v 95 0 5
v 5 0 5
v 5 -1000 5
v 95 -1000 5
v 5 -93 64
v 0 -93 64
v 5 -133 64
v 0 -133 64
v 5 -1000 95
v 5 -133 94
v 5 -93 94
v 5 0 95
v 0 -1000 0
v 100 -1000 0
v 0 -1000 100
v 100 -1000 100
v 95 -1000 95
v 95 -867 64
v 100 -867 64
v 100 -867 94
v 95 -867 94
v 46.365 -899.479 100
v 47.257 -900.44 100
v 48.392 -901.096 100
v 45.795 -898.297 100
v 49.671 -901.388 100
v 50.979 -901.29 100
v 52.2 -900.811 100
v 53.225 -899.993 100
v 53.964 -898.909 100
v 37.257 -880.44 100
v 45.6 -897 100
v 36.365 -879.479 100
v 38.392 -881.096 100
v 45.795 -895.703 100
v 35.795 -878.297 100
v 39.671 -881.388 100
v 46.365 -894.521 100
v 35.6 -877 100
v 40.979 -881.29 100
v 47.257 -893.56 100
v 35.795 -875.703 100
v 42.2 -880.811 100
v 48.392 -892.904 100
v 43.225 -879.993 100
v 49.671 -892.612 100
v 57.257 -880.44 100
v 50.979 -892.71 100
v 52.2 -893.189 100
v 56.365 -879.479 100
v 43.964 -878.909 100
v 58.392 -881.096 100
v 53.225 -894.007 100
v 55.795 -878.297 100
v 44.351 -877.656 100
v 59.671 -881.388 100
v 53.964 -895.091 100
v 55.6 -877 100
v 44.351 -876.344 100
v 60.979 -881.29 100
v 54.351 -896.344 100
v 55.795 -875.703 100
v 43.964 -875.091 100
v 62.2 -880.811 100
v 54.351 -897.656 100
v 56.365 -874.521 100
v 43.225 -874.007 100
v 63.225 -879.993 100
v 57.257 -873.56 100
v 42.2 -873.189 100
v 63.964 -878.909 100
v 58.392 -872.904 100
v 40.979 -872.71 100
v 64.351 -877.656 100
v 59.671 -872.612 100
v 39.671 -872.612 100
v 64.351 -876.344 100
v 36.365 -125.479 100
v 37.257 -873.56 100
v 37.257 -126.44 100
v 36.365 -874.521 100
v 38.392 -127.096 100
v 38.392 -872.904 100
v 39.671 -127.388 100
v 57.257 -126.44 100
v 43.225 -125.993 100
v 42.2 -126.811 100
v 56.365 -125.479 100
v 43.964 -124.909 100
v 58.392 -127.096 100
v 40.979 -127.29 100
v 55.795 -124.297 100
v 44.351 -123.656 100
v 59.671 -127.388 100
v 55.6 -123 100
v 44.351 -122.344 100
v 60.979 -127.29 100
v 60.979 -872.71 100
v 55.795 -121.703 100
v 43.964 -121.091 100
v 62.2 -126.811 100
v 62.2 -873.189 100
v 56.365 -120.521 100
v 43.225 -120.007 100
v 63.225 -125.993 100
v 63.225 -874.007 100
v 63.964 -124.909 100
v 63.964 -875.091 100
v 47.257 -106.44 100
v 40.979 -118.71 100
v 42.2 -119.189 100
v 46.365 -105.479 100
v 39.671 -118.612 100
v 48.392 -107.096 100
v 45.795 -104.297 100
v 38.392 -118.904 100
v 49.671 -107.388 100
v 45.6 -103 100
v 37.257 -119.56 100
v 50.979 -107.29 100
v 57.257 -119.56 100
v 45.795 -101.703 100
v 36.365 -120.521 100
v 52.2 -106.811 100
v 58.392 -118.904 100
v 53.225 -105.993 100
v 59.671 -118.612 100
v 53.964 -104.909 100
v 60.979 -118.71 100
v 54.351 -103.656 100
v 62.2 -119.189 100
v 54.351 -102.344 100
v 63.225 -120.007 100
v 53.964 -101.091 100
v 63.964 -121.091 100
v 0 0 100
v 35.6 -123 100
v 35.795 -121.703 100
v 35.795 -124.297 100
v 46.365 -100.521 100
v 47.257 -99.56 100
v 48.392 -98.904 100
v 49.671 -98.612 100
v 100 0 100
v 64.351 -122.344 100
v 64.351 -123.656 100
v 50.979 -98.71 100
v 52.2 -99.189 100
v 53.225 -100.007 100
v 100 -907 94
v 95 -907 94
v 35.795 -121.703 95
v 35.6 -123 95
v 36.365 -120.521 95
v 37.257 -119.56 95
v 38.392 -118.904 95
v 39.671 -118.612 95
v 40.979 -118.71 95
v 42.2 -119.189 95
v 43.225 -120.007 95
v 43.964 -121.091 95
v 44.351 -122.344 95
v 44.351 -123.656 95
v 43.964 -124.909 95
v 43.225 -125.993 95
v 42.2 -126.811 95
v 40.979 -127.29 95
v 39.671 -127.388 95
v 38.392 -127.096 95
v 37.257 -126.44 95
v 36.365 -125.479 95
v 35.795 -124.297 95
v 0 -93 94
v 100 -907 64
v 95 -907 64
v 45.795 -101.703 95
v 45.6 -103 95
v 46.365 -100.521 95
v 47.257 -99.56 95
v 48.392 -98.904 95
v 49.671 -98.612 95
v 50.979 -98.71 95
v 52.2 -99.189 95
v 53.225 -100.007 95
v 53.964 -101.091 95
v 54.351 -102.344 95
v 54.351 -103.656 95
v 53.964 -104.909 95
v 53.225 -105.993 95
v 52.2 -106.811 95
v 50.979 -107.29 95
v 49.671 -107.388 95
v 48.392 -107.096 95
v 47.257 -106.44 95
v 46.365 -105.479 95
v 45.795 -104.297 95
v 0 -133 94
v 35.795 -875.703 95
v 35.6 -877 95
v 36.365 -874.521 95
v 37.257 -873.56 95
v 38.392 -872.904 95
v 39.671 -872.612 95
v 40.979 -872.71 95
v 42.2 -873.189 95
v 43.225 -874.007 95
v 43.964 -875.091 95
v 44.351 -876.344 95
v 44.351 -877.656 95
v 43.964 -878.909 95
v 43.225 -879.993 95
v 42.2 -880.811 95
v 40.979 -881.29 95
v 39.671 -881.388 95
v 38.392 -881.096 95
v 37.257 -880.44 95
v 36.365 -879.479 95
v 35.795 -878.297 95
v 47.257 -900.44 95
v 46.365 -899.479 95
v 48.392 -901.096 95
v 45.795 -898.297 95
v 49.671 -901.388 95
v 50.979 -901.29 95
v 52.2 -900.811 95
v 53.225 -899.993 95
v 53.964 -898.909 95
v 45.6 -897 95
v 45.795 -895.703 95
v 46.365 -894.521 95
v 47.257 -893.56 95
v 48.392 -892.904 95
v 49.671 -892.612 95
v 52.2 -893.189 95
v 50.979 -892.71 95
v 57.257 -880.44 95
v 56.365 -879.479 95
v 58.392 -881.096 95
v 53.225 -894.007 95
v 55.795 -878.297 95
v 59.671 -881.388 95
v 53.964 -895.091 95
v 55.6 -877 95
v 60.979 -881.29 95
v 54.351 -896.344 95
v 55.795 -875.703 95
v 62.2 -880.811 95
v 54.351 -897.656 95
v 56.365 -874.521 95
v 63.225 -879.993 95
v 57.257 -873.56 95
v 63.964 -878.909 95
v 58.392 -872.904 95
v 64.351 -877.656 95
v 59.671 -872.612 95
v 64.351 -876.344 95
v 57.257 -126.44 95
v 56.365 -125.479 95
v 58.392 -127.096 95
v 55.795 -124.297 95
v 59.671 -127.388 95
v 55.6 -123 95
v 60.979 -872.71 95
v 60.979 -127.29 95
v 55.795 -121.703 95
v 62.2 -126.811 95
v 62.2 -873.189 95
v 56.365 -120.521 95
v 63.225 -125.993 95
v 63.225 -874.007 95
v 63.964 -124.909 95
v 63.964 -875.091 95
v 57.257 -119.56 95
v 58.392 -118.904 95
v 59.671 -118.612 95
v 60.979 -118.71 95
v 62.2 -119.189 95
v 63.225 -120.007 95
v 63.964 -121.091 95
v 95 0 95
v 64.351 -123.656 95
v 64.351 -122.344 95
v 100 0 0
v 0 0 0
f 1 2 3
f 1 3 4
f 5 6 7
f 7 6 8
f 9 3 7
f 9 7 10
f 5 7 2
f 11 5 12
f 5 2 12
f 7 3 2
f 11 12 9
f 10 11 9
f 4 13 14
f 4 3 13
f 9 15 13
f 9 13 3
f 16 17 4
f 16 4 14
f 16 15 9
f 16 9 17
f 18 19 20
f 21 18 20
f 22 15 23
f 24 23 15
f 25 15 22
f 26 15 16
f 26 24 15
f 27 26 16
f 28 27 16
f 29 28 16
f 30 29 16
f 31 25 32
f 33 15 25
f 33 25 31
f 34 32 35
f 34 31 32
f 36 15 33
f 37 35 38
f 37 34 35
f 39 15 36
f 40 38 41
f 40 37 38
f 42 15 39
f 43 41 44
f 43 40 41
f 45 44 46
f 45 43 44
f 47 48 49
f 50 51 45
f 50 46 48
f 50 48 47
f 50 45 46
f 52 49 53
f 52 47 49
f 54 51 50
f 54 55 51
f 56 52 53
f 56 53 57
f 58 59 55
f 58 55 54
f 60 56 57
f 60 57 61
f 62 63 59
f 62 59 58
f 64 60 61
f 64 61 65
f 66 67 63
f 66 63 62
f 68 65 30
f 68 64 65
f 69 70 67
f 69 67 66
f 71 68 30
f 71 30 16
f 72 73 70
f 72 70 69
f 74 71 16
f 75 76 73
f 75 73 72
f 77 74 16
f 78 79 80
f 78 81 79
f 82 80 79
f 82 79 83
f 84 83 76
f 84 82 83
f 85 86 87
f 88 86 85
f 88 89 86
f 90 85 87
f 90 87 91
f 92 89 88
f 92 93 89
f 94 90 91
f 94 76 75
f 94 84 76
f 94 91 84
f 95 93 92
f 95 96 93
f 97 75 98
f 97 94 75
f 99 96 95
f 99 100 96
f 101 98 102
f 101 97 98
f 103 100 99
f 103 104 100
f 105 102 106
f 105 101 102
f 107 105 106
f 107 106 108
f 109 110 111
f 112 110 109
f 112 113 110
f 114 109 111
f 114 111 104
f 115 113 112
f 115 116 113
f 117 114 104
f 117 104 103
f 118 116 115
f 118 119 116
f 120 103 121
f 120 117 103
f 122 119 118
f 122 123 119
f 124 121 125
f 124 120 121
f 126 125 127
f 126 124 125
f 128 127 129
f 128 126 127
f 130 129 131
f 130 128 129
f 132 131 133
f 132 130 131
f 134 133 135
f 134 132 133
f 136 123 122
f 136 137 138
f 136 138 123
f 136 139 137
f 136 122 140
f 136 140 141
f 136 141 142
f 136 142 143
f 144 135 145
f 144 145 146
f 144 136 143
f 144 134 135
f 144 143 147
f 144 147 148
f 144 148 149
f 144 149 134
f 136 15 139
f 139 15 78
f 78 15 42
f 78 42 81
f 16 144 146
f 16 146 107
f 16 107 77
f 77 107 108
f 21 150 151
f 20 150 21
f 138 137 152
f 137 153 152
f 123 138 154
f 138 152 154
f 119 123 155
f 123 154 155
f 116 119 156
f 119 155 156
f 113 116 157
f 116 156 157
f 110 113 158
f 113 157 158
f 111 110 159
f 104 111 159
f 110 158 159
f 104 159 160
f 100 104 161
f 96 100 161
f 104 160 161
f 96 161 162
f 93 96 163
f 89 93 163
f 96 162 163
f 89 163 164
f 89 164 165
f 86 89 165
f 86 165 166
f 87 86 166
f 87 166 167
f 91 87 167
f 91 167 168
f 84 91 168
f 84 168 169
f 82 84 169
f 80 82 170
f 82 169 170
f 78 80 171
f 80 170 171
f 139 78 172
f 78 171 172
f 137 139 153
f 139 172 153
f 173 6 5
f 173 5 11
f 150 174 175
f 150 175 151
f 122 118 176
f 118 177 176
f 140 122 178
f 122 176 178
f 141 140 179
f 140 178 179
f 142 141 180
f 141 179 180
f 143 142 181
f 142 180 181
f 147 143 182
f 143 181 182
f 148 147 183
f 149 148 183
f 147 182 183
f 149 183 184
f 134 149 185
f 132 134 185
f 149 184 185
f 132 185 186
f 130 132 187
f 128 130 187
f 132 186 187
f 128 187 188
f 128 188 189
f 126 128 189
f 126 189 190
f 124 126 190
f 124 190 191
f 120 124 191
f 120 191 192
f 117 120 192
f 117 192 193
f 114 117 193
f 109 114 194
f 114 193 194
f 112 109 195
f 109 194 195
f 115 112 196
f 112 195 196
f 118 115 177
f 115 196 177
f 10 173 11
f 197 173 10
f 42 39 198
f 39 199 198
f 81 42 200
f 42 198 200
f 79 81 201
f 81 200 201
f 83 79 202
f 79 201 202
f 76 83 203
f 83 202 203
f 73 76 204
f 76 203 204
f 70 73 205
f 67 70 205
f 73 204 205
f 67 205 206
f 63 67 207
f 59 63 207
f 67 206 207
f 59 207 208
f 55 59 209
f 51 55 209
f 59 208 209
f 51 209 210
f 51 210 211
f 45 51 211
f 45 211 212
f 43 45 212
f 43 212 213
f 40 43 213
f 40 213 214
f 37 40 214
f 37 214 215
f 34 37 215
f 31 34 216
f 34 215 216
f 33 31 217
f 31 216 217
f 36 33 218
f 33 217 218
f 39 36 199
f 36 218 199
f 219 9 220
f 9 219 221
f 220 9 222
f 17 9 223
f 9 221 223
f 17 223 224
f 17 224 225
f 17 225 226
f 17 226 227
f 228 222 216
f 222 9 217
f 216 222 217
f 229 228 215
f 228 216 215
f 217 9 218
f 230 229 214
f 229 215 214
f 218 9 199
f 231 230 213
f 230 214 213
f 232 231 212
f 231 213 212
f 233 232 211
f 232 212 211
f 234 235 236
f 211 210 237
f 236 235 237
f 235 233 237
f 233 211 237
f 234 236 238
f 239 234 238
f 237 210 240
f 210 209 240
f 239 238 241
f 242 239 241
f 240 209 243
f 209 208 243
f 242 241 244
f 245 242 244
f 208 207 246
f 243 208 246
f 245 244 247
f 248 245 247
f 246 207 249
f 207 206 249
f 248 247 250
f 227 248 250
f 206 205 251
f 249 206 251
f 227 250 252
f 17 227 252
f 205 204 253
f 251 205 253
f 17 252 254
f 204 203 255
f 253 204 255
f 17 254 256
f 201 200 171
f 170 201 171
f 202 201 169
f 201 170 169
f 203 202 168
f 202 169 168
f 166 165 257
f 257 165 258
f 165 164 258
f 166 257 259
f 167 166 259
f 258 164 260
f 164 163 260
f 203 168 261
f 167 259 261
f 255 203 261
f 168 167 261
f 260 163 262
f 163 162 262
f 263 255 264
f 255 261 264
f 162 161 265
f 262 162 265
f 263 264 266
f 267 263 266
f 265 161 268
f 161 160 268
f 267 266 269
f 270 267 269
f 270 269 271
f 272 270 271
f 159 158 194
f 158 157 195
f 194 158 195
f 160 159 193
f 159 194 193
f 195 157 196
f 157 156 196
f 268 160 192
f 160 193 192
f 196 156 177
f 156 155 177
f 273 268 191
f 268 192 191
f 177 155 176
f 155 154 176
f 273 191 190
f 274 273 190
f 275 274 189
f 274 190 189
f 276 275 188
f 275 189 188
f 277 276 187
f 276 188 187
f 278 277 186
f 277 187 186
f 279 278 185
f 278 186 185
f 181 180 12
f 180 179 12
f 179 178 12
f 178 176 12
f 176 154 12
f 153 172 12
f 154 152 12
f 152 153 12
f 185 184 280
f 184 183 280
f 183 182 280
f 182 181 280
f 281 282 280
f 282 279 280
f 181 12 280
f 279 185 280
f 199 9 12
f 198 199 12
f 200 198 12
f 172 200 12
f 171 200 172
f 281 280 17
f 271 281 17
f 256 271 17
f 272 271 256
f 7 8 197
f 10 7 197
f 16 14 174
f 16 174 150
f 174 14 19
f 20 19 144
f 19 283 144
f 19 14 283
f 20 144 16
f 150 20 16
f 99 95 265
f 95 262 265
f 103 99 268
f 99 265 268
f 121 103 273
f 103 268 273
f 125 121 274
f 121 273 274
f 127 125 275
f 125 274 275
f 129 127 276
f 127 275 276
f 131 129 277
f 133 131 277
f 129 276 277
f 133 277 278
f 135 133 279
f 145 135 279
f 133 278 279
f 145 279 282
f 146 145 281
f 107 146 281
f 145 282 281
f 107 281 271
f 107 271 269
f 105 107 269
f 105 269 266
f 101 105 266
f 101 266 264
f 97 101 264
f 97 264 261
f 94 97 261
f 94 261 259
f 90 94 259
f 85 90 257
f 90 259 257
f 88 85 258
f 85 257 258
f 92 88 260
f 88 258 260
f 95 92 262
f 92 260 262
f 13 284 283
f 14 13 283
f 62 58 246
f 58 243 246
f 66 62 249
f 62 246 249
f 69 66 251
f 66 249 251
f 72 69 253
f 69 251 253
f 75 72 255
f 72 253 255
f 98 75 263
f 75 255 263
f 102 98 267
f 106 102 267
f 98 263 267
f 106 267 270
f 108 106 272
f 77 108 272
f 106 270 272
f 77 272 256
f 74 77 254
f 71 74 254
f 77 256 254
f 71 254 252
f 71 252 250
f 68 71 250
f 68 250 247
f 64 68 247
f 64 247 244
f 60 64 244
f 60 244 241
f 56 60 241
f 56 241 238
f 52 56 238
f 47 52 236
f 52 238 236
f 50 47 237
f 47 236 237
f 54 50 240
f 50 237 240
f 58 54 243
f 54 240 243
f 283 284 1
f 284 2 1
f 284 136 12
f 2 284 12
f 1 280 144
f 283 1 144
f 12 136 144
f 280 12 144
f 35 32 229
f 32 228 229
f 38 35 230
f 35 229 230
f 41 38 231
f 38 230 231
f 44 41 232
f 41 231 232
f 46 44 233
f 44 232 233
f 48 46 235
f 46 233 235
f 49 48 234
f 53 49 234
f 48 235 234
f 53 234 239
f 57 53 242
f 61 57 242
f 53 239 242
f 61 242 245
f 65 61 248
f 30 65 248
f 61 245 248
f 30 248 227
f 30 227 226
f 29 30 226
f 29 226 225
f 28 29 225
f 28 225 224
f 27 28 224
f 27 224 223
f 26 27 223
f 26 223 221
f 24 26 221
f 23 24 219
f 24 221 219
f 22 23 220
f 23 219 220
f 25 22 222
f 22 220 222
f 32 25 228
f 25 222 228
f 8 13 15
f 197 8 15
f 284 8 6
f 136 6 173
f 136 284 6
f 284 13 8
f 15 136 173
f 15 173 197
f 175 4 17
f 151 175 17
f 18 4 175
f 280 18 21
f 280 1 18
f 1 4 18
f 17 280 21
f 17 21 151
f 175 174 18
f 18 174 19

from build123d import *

# Parameters (mm, degrees)
F0_W     = 100
F0_H     = 100
F0_W_2   = 90
F0_H_2   = 90
F1_DEPTH = 1000
F2_W     = 40
F2_H     = 30
F3_DEPTH = 5
F4_W     = 40
F4_H     = 30
F5_DEPTH = 5
F7_D     = 8.8
F7_DEPTH = 5
F7_TIP   = 2.6437867237


with BuildPart() as f1:
    # F0 (on Front) → F1 (new body)
    with BuildSketch(Plane.XZ):
        with Locations((50, 50)):
            Rectangle(F0_W, F0_H)
        with Locations((50, 50)):
            Rectangle(F0_W_2, F0_H_2, mode=Mode.SUBTRACT)
    extrude(amount=F1_DEPTH)

    # F2 (on face) → F3 (cut)
    with BuildSketch(Plane.YZ.offset(100)):
        with Locations((-887, 79)):
            Rectangle(F2_W, F2_H)
    extrude(amount=-F3_DEPTH, mode=Mode.SUBTRACT)

    # F4 (on face) → F5 (cut)
    with BuildSketch(Plane(origin=(0, 0, 0), x_dir=(0, -1, 0), z_dir=(-1, 0, 0))):
        with Locations((113, 79)):
            Rectangle(F4_W, F4_H)
    extrude(amount=-F5_DEPTH, mode=Mode.SUBTRACT)

    # F7
    with Locations(Plane.XY.offset(100)):
        with Locations((50, -103), (40, -123), (60, -123), (40, -877), (60, -877), (50, -897)):
            Hole(F7_D / 2, depth=F7_DEPTH)
            with Locations((0, 0, -(F7_DEPTH + F7_TIP / 2))):  # 118° drill point
                Cone(0, F7_D / 2, F7_TIP, mode=Mode.SUBTRACT)


solid = f1.part
